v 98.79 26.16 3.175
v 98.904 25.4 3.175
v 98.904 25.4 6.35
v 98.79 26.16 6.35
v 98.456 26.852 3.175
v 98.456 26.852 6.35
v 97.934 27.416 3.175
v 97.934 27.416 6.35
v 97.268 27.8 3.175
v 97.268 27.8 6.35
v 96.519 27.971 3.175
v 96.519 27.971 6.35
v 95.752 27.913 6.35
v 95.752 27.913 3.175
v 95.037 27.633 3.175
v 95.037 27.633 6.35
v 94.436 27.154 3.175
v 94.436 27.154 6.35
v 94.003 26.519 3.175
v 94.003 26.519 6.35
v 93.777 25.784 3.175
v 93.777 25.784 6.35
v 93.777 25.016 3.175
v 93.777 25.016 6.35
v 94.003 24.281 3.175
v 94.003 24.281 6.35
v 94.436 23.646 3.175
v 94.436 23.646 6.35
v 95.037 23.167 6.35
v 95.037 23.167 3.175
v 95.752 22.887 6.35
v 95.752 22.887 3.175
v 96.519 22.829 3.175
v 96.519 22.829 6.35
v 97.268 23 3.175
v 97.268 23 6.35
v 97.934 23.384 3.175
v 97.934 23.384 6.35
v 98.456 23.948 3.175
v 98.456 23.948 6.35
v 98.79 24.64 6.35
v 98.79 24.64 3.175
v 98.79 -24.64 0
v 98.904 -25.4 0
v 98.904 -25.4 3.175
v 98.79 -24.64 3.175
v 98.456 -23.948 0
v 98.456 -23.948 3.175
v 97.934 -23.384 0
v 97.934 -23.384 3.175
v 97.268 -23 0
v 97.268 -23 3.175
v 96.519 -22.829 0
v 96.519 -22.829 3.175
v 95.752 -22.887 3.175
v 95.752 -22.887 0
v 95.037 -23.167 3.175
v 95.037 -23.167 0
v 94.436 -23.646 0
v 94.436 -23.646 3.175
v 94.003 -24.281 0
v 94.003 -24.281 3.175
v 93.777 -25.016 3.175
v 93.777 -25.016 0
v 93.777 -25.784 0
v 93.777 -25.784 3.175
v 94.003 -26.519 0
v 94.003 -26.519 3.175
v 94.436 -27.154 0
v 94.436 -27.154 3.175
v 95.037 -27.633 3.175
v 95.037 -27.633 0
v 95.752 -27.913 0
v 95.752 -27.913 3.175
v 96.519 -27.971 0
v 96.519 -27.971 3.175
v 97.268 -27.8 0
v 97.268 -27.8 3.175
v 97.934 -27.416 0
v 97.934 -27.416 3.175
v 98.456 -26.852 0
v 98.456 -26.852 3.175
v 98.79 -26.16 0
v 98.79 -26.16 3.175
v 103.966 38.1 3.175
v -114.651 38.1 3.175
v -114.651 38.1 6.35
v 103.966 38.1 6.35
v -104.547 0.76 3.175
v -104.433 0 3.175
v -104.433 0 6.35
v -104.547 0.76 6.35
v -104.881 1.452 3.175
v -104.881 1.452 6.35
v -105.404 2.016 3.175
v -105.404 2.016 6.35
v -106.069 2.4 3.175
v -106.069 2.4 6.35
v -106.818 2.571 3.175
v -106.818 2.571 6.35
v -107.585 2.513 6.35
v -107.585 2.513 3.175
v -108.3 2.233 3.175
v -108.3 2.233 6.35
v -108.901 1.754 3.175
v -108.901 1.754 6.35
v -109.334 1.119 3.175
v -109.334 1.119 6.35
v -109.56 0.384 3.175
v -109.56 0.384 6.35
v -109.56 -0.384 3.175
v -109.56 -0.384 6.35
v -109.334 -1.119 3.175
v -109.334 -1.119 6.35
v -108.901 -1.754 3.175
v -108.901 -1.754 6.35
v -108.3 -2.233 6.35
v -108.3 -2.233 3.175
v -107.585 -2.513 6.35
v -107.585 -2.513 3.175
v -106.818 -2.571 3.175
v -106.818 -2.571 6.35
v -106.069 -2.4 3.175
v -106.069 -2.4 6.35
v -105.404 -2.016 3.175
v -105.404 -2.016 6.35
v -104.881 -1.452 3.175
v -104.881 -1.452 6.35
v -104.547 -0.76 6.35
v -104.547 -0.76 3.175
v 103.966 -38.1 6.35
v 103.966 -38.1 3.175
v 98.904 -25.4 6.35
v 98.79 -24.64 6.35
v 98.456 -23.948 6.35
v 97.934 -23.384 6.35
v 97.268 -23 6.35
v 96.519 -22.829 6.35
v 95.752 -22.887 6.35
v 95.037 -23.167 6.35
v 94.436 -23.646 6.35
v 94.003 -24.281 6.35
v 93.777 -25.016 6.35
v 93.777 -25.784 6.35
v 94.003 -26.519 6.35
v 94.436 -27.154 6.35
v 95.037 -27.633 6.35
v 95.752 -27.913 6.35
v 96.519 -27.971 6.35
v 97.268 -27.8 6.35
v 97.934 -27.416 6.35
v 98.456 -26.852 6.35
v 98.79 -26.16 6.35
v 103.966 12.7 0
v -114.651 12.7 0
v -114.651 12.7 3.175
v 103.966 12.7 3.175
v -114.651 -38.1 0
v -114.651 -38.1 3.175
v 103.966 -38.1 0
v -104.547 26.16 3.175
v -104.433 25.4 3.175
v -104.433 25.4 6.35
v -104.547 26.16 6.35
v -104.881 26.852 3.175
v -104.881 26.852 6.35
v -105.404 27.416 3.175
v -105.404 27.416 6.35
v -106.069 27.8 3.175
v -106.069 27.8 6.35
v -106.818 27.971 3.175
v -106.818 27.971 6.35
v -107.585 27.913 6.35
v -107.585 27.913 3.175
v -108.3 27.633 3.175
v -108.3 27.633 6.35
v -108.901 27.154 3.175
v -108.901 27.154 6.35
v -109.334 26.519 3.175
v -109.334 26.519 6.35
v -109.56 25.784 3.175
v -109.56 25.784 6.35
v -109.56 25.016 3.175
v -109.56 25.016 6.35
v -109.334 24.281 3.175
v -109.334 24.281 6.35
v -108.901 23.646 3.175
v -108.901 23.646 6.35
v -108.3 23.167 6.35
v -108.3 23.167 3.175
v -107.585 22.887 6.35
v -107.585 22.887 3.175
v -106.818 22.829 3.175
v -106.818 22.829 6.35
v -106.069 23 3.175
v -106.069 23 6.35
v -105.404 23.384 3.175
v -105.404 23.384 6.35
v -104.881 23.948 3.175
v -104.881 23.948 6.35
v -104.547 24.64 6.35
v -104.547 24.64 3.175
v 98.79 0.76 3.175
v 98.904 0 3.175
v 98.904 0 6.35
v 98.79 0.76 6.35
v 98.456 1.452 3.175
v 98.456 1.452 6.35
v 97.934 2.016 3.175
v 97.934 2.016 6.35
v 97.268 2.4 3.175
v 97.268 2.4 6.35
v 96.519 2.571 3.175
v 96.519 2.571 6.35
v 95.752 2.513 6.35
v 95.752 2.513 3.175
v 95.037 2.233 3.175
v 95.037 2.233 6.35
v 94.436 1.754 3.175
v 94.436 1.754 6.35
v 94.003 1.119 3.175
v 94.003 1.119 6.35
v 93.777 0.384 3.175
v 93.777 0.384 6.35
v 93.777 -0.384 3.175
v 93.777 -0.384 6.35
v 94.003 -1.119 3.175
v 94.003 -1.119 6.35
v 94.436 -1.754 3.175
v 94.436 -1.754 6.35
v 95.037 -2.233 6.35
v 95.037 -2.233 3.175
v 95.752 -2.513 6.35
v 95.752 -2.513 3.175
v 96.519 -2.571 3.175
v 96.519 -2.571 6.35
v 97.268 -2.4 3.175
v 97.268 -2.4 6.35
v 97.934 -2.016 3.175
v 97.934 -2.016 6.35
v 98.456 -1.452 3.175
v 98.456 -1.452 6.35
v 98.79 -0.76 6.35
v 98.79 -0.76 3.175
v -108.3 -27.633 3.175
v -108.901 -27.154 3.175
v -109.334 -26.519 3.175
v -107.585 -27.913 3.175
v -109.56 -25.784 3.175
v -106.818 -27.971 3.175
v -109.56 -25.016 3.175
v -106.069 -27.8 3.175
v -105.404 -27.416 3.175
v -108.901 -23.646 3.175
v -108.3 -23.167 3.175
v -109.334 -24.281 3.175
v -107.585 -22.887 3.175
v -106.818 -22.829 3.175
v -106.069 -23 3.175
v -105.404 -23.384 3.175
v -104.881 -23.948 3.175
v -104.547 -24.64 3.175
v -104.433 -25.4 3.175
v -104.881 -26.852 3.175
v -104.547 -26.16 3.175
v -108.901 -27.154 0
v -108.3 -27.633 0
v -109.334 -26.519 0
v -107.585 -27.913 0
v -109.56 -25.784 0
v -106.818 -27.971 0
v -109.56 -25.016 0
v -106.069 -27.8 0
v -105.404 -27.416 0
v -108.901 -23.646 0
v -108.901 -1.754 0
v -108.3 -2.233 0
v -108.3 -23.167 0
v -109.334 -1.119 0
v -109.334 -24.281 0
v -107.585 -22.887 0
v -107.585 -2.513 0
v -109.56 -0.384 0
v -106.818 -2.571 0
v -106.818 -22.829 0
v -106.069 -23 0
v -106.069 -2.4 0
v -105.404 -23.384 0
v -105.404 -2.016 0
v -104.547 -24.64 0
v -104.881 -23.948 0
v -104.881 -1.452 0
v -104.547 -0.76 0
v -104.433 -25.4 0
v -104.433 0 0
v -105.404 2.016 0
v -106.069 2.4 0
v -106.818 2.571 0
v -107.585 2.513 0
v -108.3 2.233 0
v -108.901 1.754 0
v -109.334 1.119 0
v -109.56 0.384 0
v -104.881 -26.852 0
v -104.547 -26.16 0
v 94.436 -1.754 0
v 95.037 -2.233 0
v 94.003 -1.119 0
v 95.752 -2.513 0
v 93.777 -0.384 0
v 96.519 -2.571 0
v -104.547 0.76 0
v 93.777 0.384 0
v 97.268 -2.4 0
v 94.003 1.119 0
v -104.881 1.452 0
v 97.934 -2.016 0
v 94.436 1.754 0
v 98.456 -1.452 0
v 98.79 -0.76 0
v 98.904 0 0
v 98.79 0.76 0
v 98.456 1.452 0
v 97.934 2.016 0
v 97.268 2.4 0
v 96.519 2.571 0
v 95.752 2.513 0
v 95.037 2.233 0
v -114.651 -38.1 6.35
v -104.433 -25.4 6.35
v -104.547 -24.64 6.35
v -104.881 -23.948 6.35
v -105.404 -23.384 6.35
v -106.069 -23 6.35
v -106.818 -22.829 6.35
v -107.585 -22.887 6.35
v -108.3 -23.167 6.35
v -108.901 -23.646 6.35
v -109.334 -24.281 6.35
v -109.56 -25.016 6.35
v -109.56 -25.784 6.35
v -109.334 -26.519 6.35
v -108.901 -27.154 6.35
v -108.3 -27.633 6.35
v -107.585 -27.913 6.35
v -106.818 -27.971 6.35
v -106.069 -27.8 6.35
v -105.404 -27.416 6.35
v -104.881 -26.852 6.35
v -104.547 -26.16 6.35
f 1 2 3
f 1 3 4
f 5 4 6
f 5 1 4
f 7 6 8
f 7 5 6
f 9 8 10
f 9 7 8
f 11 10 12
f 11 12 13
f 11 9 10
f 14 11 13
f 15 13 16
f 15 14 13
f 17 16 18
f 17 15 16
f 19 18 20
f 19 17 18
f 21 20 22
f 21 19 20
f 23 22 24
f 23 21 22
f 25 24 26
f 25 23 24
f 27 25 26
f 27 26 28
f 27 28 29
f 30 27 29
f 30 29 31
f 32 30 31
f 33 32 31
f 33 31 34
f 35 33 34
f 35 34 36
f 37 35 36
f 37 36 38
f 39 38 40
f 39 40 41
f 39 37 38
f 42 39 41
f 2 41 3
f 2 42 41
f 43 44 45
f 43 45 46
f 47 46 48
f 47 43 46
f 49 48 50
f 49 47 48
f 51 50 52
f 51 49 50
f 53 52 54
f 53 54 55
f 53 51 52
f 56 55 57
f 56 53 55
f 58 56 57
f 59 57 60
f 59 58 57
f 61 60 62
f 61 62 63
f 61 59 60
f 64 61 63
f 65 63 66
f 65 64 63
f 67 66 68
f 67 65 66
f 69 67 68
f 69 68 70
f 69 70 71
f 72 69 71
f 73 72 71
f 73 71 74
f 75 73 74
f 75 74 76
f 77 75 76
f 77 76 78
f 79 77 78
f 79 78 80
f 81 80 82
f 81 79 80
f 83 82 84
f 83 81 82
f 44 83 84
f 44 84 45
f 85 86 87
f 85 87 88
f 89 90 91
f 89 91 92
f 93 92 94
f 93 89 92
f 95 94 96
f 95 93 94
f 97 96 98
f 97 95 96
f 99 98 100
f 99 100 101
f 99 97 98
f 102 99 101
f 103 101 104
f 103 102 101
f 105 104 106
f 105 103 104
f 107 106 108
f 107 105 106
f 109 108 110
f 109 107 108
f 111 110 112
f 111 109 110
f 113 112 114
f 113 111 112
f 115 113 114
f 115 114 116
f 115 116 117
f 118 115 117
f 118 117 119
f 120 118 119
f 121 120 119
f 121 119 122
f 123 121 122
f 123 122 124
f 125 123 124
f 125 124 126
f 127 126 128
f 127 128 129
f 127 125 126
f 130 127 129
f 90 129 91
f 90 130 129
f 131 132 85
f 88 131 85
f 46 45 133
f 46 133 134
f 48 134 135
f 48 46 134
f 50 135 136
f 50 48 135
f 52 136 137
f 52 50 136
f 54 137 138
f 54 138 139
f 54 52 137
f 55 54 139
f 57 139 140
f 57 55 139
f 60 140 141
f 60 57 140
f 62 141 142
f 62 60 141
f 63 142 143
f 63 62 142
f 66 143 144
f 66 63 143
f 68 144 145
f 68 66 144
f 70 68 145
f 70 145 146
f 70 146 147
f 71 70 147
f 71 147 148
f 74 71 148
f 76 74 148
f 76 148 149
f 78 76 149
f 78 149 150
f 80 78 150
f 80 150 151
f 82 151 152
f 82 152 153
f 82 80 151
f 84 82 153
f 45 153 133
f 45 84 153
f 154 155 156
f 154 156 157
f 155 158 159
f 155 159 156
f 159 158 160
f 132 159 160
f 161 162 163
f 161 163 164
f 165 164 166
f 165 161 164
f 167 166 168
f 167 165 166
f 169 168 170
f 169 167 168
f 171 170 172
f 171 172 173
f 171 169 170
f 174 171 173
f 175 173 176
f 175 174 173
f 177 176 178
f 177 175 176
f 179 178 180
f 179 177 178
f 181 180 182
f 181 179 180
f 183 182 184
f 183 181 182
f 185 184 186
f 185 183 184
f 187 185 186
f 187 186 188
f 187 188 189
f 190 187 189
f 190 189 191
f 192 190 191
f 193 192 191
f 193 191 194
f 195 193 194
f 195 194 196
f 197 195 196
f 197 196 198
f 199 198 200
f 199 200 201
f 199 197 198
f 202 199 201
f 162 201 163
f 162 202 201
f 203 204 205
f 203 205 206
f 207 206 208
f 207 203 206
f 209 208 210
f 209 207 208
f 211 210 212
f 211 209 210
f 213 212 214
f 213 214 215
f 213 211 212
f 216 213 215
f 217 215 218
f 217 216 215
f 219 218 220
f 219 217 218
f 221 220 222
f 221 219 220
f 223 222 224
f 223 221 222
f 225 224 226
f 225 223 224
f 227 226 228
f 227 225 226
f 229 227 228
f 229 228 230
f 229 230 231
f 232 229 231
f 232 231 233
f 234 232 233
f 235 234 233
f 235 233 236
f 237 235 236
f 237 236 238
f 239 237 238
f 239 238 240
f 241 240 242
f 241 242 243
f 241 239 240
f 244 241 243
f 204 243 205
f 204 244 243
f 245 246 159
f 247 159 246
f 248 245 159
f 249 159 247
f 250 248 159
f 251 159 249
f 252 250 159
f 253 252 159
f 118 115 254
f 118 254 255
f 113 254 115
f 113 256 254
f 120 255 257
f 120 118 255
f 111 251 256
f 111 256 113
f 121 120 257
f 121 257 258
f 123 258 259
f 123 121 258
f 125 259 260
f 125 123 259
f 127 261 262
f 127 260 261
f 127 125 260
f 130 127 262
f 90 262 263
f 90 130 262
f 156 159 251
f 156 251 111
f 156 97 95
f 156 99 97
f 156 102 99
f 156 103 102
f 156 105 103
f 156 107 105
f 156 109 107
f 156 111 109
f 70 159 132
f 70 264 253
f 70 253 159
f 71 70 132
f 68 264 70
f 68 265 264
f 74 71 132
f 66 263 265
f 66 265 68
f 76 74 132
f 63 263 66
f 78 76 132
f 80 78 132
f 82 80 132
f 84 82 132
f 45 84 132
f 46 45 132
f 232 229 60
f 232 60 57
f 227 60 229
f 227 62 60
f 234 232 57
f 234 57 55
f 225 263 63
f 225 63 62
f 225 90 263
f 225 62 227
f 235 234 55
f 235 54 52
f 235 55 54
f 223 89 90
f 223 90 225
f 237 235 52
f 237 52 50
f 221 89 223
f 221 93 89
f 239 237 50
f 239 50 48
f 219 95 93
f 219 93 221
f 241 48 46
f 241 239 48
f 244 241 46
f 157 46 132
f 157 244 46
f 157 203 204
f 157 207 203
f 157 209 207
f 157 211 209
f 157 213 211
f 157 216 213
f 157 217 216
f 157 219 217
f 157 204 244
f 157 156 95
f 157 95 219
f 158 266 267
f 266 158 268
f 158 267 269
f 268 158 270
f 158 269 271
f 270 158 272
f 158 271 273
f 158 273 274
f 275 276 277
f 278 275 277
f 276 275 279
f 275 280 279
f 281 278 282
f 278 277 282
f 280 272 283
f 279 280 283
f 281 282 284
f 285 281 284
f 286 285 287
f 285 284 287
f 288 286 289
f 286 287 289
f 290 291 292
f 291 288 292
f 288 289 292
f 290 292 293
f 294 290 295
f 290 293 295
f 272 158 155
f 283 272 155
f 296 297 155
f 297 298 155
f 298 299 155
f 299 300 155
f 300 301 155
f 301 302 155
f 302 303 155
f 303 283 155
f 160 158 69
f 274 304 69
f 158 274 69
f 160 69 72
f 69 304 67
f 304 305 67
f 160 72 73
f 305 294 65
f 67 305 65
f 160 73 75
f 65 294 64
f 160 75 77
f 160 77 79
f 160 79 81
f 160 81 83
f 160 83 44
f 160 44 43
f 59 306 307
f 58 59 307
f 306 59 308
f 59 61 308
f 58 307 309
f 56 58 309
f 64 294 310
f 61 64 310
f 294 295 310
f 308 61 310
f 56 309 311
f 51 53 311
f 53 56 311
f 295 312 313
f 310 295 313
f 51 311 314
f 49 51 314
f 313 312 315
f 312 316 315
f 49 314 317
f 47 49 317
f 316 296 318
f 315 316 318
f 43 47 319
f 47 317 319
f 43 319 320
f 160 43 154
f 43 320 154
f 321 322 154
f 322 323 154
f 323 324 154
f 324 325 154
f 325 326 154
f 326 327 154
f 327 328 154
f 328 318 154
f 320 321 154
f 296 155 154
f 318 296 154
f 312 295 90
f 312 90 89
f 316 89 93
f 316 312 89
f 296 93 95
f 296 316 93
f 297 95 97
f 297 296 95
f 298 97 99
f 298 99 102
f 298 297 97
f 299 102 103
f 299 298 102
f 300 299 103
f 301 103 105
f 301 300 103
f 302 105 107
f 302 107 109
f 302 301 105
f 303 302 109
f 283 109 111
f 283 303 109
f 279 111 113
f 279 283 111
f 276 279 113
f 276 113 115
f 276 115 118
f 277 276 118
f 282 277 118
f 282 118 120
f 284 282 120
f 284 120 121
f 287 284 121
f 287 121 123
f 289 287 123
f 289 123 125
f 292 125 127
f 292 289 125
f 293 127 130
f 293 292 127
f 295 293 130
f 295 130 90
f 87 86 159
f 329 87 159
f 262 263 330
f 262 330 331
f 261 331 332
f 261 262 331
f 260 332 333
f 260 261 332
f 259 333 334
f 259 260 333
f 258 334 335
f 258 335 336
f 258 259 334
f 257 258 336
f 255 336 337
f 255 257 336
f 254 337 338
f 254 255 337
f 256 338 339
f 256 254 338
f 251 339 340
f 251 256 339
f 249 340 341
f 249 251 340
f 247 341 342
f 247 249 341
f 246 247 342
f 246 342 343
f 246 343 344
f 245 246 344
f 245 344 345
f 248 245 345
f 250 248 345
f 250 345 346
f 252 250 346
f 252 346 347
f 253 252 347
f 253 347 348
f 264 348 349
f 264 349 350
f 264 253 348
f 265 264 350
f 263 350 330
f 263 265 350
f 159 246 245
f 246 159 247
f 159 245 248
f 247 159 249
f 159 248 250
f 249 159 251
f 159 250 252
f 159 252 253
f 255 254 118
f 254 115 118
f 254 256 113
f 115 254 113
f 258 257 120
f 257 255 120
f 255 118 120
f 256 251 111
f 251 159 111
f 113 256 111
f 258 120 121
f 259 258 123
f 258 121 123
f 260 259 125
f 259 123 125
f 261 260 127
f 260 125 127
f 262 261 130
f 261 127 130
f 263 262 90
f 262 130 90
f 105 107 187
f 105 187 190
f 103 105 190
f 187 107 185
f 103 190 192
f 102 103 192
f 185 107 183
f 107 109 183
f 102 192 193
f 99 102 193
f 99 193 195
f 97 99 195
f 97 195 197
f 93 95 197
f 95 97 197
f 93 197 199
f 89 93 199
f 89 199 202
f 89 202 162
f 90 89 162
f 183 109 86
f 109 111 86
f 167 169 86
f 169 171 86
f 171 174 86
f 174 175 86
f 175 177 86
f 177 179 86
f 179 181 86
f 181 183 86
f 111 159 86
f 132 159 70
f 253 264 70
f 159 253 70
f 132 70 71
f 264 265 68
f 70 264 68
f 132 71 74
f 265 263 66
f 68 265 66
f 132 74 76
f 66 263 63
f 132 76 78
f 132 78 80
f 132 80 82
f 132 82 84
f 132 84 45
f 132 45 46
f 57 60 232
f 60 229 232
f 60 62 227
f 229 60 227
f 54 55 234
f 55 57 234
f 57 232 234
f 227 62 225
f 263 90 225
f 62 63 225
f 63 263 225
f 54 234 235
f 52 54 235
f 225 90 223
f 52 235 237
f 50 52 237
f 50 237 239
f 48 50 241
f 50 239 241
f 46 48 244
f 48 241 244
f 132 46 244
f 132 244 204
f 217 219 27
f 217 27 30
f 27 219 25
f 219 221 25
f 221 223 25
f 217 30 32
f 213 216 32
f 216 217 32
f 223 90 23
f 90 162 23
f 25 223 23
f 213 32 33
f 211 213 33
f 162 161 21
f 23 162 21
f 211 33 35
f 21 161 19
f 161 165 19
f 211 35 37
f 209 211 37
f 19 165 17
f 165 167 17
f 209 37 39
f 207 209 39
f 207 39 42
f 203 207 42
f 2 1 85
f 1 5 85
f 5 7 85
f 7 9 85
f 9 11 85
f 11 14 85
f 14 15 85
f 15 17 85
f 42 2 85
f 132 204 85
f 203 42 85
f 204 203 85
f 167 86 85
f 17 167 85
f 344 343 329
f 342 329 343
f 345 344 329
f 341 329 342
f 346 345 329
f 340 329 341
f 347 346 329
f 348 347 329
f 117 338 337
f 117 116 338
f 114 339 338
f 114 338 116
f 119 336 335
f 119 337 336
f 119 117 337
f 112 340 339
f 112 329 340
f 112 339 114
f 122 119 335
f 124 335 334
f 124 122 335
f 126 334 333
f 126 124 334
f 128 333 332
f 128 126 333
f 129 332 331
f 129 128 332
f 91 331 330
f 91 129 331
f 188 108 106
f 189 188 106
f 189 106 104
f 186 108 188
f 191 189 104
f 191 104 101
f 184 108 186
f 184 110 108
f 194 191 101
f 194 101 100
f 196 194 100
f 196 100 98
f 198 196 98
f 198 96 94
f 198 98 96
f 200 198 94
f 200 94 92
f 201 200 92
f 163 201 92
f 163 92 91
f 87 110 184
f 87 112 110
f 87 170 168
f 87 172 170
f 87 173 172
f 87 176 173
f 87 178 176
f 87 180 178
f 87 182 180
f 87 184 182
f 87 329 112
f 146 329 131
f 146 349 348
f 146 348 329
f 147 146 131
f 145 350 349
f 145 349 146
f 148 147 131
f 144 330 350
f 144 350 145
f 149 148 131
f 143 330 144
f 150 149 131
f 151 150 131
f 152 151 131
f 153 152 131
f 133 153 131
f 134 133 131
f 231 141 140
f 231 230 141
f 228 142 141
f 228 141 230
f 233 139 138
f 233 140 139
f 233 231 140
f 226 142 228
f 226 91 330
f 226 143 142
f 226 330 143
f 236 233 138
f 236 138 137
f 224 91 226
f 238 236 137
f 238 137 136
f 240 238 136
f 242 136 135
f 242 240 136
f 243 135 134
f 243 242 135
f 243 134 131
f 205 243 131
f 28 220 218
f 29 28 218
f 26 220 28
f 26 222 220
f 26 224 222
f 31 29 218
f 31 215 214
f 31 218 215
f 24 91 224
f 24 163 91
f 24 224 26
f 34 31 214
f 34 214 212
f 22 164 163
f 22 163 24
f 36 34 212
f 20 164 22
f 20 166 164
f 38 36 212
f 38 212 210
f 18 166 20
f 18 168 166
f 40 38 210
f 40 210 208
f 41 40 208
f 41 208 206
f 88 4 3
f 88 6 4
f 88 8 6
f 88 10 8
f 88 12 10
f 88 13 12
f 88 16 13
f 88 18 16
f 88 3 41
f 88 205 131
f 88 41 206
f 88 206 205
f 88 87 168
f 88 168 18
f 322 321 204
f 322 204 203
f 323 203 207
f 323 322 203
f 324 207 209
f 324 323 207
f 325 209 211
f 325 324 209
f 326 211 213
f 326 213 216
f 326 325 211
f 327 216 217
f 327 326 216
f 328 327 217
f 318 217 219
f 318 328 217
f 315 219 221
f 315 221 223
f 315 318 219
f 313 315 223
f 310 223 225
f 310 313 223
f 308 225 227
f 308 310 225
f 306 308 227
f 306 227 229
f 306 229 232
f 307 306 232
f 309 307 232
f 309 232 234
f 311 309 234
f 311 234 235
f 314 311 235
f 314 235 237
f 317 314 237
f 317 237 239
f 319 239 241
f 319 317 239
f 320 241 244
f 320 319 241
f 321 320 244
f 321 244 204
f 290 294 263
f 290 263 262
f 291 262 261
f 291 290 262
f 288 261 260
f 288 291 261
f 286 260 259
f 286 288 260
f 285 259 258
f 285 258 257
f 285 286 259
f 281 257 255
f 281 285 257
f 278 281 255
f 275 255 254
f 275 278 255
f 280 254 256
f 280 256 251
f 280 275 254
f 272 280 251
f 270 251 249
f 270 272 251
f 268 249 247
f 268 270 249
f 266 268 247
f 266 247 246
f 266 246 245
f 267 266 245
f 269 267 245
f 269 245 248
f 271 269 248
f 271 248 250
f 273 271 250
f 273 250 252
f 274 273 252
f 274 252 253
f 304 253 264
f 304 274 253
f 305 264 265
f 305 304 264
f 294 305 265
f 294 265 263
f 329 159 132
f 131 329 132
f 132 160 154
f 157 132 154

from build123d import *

# Parameters (mm, degrees)
F0_W     = 218.6178
F0_H     = 50.8
F0_R     = 2.5781
F1_DEPTH = 3.175
F2_START = 3.175
F0_H_2   = 25.4
F2_DEPTH = 3.175


with BuildPart() as f1:
    # F0 (on Top) → F1 (new body)
    with BuildSketch(Plane.XY):
        with Locations((-5.3424164653, -12.7)):
            Rectangle(F0_W, F0_H)
        with Locations((-107.0109964653, -25.4)):
            Circle(F0_R, mode=Mode.SUBTRACT)
        with Locations((96.3261635347, -25.4)):
            Circle(F0_R, mode=Mode.SUBTRACT)
        with Locations((-107.0109964653, 0)):
            Circle(F0_R, mode=Mode.SUBTRACT)
        with Locations((96.3261635347, 0)):
            Circle(F0_R, mode=Mode.SUBTRACT)
    extrude(amount=F1_DEPTH)


with BuildPart() as f2:
    # F0 (on Top) → F2 (new body)
    with BuildSketch(Plane.XY.offset(F2_START)):
        with Locations((-5.3424164653, -12.7)):
            Rectangle(F0_W, F0_H)
        with Locations((-107.0109964653, -25.4)):
            Circle(F0_R, mode=Mode.SUBTRACT)
        with Locations((96.3261635347, -25.4)):
            Circle(F0_R, mode=Mode.SUBTRACT)
        with Locations((-107.0109964653, 0)):
            Circle(F0_R, mode=Mode.SUBTRACT)
        with Locations((96.3261635347, 0)):
            Circle(F0_R, mode=Mode.SUBTRACT)
        with Locations((-5.3424164653, 25.4)):
            Rectangle(F0_W, F0_H_2)
        with Locations((-107.0109964653, 25.4)):
            Circle(F0_R, mode=Mode.SUBTRACT)
        with Locations((96.3261635347, 25.4)):
            Circle(F0_R, mode=Mode.SUBTRACT)
    extrude(amount=F2_DEPTH)


solid = Compound([f1.part, f2.part])
